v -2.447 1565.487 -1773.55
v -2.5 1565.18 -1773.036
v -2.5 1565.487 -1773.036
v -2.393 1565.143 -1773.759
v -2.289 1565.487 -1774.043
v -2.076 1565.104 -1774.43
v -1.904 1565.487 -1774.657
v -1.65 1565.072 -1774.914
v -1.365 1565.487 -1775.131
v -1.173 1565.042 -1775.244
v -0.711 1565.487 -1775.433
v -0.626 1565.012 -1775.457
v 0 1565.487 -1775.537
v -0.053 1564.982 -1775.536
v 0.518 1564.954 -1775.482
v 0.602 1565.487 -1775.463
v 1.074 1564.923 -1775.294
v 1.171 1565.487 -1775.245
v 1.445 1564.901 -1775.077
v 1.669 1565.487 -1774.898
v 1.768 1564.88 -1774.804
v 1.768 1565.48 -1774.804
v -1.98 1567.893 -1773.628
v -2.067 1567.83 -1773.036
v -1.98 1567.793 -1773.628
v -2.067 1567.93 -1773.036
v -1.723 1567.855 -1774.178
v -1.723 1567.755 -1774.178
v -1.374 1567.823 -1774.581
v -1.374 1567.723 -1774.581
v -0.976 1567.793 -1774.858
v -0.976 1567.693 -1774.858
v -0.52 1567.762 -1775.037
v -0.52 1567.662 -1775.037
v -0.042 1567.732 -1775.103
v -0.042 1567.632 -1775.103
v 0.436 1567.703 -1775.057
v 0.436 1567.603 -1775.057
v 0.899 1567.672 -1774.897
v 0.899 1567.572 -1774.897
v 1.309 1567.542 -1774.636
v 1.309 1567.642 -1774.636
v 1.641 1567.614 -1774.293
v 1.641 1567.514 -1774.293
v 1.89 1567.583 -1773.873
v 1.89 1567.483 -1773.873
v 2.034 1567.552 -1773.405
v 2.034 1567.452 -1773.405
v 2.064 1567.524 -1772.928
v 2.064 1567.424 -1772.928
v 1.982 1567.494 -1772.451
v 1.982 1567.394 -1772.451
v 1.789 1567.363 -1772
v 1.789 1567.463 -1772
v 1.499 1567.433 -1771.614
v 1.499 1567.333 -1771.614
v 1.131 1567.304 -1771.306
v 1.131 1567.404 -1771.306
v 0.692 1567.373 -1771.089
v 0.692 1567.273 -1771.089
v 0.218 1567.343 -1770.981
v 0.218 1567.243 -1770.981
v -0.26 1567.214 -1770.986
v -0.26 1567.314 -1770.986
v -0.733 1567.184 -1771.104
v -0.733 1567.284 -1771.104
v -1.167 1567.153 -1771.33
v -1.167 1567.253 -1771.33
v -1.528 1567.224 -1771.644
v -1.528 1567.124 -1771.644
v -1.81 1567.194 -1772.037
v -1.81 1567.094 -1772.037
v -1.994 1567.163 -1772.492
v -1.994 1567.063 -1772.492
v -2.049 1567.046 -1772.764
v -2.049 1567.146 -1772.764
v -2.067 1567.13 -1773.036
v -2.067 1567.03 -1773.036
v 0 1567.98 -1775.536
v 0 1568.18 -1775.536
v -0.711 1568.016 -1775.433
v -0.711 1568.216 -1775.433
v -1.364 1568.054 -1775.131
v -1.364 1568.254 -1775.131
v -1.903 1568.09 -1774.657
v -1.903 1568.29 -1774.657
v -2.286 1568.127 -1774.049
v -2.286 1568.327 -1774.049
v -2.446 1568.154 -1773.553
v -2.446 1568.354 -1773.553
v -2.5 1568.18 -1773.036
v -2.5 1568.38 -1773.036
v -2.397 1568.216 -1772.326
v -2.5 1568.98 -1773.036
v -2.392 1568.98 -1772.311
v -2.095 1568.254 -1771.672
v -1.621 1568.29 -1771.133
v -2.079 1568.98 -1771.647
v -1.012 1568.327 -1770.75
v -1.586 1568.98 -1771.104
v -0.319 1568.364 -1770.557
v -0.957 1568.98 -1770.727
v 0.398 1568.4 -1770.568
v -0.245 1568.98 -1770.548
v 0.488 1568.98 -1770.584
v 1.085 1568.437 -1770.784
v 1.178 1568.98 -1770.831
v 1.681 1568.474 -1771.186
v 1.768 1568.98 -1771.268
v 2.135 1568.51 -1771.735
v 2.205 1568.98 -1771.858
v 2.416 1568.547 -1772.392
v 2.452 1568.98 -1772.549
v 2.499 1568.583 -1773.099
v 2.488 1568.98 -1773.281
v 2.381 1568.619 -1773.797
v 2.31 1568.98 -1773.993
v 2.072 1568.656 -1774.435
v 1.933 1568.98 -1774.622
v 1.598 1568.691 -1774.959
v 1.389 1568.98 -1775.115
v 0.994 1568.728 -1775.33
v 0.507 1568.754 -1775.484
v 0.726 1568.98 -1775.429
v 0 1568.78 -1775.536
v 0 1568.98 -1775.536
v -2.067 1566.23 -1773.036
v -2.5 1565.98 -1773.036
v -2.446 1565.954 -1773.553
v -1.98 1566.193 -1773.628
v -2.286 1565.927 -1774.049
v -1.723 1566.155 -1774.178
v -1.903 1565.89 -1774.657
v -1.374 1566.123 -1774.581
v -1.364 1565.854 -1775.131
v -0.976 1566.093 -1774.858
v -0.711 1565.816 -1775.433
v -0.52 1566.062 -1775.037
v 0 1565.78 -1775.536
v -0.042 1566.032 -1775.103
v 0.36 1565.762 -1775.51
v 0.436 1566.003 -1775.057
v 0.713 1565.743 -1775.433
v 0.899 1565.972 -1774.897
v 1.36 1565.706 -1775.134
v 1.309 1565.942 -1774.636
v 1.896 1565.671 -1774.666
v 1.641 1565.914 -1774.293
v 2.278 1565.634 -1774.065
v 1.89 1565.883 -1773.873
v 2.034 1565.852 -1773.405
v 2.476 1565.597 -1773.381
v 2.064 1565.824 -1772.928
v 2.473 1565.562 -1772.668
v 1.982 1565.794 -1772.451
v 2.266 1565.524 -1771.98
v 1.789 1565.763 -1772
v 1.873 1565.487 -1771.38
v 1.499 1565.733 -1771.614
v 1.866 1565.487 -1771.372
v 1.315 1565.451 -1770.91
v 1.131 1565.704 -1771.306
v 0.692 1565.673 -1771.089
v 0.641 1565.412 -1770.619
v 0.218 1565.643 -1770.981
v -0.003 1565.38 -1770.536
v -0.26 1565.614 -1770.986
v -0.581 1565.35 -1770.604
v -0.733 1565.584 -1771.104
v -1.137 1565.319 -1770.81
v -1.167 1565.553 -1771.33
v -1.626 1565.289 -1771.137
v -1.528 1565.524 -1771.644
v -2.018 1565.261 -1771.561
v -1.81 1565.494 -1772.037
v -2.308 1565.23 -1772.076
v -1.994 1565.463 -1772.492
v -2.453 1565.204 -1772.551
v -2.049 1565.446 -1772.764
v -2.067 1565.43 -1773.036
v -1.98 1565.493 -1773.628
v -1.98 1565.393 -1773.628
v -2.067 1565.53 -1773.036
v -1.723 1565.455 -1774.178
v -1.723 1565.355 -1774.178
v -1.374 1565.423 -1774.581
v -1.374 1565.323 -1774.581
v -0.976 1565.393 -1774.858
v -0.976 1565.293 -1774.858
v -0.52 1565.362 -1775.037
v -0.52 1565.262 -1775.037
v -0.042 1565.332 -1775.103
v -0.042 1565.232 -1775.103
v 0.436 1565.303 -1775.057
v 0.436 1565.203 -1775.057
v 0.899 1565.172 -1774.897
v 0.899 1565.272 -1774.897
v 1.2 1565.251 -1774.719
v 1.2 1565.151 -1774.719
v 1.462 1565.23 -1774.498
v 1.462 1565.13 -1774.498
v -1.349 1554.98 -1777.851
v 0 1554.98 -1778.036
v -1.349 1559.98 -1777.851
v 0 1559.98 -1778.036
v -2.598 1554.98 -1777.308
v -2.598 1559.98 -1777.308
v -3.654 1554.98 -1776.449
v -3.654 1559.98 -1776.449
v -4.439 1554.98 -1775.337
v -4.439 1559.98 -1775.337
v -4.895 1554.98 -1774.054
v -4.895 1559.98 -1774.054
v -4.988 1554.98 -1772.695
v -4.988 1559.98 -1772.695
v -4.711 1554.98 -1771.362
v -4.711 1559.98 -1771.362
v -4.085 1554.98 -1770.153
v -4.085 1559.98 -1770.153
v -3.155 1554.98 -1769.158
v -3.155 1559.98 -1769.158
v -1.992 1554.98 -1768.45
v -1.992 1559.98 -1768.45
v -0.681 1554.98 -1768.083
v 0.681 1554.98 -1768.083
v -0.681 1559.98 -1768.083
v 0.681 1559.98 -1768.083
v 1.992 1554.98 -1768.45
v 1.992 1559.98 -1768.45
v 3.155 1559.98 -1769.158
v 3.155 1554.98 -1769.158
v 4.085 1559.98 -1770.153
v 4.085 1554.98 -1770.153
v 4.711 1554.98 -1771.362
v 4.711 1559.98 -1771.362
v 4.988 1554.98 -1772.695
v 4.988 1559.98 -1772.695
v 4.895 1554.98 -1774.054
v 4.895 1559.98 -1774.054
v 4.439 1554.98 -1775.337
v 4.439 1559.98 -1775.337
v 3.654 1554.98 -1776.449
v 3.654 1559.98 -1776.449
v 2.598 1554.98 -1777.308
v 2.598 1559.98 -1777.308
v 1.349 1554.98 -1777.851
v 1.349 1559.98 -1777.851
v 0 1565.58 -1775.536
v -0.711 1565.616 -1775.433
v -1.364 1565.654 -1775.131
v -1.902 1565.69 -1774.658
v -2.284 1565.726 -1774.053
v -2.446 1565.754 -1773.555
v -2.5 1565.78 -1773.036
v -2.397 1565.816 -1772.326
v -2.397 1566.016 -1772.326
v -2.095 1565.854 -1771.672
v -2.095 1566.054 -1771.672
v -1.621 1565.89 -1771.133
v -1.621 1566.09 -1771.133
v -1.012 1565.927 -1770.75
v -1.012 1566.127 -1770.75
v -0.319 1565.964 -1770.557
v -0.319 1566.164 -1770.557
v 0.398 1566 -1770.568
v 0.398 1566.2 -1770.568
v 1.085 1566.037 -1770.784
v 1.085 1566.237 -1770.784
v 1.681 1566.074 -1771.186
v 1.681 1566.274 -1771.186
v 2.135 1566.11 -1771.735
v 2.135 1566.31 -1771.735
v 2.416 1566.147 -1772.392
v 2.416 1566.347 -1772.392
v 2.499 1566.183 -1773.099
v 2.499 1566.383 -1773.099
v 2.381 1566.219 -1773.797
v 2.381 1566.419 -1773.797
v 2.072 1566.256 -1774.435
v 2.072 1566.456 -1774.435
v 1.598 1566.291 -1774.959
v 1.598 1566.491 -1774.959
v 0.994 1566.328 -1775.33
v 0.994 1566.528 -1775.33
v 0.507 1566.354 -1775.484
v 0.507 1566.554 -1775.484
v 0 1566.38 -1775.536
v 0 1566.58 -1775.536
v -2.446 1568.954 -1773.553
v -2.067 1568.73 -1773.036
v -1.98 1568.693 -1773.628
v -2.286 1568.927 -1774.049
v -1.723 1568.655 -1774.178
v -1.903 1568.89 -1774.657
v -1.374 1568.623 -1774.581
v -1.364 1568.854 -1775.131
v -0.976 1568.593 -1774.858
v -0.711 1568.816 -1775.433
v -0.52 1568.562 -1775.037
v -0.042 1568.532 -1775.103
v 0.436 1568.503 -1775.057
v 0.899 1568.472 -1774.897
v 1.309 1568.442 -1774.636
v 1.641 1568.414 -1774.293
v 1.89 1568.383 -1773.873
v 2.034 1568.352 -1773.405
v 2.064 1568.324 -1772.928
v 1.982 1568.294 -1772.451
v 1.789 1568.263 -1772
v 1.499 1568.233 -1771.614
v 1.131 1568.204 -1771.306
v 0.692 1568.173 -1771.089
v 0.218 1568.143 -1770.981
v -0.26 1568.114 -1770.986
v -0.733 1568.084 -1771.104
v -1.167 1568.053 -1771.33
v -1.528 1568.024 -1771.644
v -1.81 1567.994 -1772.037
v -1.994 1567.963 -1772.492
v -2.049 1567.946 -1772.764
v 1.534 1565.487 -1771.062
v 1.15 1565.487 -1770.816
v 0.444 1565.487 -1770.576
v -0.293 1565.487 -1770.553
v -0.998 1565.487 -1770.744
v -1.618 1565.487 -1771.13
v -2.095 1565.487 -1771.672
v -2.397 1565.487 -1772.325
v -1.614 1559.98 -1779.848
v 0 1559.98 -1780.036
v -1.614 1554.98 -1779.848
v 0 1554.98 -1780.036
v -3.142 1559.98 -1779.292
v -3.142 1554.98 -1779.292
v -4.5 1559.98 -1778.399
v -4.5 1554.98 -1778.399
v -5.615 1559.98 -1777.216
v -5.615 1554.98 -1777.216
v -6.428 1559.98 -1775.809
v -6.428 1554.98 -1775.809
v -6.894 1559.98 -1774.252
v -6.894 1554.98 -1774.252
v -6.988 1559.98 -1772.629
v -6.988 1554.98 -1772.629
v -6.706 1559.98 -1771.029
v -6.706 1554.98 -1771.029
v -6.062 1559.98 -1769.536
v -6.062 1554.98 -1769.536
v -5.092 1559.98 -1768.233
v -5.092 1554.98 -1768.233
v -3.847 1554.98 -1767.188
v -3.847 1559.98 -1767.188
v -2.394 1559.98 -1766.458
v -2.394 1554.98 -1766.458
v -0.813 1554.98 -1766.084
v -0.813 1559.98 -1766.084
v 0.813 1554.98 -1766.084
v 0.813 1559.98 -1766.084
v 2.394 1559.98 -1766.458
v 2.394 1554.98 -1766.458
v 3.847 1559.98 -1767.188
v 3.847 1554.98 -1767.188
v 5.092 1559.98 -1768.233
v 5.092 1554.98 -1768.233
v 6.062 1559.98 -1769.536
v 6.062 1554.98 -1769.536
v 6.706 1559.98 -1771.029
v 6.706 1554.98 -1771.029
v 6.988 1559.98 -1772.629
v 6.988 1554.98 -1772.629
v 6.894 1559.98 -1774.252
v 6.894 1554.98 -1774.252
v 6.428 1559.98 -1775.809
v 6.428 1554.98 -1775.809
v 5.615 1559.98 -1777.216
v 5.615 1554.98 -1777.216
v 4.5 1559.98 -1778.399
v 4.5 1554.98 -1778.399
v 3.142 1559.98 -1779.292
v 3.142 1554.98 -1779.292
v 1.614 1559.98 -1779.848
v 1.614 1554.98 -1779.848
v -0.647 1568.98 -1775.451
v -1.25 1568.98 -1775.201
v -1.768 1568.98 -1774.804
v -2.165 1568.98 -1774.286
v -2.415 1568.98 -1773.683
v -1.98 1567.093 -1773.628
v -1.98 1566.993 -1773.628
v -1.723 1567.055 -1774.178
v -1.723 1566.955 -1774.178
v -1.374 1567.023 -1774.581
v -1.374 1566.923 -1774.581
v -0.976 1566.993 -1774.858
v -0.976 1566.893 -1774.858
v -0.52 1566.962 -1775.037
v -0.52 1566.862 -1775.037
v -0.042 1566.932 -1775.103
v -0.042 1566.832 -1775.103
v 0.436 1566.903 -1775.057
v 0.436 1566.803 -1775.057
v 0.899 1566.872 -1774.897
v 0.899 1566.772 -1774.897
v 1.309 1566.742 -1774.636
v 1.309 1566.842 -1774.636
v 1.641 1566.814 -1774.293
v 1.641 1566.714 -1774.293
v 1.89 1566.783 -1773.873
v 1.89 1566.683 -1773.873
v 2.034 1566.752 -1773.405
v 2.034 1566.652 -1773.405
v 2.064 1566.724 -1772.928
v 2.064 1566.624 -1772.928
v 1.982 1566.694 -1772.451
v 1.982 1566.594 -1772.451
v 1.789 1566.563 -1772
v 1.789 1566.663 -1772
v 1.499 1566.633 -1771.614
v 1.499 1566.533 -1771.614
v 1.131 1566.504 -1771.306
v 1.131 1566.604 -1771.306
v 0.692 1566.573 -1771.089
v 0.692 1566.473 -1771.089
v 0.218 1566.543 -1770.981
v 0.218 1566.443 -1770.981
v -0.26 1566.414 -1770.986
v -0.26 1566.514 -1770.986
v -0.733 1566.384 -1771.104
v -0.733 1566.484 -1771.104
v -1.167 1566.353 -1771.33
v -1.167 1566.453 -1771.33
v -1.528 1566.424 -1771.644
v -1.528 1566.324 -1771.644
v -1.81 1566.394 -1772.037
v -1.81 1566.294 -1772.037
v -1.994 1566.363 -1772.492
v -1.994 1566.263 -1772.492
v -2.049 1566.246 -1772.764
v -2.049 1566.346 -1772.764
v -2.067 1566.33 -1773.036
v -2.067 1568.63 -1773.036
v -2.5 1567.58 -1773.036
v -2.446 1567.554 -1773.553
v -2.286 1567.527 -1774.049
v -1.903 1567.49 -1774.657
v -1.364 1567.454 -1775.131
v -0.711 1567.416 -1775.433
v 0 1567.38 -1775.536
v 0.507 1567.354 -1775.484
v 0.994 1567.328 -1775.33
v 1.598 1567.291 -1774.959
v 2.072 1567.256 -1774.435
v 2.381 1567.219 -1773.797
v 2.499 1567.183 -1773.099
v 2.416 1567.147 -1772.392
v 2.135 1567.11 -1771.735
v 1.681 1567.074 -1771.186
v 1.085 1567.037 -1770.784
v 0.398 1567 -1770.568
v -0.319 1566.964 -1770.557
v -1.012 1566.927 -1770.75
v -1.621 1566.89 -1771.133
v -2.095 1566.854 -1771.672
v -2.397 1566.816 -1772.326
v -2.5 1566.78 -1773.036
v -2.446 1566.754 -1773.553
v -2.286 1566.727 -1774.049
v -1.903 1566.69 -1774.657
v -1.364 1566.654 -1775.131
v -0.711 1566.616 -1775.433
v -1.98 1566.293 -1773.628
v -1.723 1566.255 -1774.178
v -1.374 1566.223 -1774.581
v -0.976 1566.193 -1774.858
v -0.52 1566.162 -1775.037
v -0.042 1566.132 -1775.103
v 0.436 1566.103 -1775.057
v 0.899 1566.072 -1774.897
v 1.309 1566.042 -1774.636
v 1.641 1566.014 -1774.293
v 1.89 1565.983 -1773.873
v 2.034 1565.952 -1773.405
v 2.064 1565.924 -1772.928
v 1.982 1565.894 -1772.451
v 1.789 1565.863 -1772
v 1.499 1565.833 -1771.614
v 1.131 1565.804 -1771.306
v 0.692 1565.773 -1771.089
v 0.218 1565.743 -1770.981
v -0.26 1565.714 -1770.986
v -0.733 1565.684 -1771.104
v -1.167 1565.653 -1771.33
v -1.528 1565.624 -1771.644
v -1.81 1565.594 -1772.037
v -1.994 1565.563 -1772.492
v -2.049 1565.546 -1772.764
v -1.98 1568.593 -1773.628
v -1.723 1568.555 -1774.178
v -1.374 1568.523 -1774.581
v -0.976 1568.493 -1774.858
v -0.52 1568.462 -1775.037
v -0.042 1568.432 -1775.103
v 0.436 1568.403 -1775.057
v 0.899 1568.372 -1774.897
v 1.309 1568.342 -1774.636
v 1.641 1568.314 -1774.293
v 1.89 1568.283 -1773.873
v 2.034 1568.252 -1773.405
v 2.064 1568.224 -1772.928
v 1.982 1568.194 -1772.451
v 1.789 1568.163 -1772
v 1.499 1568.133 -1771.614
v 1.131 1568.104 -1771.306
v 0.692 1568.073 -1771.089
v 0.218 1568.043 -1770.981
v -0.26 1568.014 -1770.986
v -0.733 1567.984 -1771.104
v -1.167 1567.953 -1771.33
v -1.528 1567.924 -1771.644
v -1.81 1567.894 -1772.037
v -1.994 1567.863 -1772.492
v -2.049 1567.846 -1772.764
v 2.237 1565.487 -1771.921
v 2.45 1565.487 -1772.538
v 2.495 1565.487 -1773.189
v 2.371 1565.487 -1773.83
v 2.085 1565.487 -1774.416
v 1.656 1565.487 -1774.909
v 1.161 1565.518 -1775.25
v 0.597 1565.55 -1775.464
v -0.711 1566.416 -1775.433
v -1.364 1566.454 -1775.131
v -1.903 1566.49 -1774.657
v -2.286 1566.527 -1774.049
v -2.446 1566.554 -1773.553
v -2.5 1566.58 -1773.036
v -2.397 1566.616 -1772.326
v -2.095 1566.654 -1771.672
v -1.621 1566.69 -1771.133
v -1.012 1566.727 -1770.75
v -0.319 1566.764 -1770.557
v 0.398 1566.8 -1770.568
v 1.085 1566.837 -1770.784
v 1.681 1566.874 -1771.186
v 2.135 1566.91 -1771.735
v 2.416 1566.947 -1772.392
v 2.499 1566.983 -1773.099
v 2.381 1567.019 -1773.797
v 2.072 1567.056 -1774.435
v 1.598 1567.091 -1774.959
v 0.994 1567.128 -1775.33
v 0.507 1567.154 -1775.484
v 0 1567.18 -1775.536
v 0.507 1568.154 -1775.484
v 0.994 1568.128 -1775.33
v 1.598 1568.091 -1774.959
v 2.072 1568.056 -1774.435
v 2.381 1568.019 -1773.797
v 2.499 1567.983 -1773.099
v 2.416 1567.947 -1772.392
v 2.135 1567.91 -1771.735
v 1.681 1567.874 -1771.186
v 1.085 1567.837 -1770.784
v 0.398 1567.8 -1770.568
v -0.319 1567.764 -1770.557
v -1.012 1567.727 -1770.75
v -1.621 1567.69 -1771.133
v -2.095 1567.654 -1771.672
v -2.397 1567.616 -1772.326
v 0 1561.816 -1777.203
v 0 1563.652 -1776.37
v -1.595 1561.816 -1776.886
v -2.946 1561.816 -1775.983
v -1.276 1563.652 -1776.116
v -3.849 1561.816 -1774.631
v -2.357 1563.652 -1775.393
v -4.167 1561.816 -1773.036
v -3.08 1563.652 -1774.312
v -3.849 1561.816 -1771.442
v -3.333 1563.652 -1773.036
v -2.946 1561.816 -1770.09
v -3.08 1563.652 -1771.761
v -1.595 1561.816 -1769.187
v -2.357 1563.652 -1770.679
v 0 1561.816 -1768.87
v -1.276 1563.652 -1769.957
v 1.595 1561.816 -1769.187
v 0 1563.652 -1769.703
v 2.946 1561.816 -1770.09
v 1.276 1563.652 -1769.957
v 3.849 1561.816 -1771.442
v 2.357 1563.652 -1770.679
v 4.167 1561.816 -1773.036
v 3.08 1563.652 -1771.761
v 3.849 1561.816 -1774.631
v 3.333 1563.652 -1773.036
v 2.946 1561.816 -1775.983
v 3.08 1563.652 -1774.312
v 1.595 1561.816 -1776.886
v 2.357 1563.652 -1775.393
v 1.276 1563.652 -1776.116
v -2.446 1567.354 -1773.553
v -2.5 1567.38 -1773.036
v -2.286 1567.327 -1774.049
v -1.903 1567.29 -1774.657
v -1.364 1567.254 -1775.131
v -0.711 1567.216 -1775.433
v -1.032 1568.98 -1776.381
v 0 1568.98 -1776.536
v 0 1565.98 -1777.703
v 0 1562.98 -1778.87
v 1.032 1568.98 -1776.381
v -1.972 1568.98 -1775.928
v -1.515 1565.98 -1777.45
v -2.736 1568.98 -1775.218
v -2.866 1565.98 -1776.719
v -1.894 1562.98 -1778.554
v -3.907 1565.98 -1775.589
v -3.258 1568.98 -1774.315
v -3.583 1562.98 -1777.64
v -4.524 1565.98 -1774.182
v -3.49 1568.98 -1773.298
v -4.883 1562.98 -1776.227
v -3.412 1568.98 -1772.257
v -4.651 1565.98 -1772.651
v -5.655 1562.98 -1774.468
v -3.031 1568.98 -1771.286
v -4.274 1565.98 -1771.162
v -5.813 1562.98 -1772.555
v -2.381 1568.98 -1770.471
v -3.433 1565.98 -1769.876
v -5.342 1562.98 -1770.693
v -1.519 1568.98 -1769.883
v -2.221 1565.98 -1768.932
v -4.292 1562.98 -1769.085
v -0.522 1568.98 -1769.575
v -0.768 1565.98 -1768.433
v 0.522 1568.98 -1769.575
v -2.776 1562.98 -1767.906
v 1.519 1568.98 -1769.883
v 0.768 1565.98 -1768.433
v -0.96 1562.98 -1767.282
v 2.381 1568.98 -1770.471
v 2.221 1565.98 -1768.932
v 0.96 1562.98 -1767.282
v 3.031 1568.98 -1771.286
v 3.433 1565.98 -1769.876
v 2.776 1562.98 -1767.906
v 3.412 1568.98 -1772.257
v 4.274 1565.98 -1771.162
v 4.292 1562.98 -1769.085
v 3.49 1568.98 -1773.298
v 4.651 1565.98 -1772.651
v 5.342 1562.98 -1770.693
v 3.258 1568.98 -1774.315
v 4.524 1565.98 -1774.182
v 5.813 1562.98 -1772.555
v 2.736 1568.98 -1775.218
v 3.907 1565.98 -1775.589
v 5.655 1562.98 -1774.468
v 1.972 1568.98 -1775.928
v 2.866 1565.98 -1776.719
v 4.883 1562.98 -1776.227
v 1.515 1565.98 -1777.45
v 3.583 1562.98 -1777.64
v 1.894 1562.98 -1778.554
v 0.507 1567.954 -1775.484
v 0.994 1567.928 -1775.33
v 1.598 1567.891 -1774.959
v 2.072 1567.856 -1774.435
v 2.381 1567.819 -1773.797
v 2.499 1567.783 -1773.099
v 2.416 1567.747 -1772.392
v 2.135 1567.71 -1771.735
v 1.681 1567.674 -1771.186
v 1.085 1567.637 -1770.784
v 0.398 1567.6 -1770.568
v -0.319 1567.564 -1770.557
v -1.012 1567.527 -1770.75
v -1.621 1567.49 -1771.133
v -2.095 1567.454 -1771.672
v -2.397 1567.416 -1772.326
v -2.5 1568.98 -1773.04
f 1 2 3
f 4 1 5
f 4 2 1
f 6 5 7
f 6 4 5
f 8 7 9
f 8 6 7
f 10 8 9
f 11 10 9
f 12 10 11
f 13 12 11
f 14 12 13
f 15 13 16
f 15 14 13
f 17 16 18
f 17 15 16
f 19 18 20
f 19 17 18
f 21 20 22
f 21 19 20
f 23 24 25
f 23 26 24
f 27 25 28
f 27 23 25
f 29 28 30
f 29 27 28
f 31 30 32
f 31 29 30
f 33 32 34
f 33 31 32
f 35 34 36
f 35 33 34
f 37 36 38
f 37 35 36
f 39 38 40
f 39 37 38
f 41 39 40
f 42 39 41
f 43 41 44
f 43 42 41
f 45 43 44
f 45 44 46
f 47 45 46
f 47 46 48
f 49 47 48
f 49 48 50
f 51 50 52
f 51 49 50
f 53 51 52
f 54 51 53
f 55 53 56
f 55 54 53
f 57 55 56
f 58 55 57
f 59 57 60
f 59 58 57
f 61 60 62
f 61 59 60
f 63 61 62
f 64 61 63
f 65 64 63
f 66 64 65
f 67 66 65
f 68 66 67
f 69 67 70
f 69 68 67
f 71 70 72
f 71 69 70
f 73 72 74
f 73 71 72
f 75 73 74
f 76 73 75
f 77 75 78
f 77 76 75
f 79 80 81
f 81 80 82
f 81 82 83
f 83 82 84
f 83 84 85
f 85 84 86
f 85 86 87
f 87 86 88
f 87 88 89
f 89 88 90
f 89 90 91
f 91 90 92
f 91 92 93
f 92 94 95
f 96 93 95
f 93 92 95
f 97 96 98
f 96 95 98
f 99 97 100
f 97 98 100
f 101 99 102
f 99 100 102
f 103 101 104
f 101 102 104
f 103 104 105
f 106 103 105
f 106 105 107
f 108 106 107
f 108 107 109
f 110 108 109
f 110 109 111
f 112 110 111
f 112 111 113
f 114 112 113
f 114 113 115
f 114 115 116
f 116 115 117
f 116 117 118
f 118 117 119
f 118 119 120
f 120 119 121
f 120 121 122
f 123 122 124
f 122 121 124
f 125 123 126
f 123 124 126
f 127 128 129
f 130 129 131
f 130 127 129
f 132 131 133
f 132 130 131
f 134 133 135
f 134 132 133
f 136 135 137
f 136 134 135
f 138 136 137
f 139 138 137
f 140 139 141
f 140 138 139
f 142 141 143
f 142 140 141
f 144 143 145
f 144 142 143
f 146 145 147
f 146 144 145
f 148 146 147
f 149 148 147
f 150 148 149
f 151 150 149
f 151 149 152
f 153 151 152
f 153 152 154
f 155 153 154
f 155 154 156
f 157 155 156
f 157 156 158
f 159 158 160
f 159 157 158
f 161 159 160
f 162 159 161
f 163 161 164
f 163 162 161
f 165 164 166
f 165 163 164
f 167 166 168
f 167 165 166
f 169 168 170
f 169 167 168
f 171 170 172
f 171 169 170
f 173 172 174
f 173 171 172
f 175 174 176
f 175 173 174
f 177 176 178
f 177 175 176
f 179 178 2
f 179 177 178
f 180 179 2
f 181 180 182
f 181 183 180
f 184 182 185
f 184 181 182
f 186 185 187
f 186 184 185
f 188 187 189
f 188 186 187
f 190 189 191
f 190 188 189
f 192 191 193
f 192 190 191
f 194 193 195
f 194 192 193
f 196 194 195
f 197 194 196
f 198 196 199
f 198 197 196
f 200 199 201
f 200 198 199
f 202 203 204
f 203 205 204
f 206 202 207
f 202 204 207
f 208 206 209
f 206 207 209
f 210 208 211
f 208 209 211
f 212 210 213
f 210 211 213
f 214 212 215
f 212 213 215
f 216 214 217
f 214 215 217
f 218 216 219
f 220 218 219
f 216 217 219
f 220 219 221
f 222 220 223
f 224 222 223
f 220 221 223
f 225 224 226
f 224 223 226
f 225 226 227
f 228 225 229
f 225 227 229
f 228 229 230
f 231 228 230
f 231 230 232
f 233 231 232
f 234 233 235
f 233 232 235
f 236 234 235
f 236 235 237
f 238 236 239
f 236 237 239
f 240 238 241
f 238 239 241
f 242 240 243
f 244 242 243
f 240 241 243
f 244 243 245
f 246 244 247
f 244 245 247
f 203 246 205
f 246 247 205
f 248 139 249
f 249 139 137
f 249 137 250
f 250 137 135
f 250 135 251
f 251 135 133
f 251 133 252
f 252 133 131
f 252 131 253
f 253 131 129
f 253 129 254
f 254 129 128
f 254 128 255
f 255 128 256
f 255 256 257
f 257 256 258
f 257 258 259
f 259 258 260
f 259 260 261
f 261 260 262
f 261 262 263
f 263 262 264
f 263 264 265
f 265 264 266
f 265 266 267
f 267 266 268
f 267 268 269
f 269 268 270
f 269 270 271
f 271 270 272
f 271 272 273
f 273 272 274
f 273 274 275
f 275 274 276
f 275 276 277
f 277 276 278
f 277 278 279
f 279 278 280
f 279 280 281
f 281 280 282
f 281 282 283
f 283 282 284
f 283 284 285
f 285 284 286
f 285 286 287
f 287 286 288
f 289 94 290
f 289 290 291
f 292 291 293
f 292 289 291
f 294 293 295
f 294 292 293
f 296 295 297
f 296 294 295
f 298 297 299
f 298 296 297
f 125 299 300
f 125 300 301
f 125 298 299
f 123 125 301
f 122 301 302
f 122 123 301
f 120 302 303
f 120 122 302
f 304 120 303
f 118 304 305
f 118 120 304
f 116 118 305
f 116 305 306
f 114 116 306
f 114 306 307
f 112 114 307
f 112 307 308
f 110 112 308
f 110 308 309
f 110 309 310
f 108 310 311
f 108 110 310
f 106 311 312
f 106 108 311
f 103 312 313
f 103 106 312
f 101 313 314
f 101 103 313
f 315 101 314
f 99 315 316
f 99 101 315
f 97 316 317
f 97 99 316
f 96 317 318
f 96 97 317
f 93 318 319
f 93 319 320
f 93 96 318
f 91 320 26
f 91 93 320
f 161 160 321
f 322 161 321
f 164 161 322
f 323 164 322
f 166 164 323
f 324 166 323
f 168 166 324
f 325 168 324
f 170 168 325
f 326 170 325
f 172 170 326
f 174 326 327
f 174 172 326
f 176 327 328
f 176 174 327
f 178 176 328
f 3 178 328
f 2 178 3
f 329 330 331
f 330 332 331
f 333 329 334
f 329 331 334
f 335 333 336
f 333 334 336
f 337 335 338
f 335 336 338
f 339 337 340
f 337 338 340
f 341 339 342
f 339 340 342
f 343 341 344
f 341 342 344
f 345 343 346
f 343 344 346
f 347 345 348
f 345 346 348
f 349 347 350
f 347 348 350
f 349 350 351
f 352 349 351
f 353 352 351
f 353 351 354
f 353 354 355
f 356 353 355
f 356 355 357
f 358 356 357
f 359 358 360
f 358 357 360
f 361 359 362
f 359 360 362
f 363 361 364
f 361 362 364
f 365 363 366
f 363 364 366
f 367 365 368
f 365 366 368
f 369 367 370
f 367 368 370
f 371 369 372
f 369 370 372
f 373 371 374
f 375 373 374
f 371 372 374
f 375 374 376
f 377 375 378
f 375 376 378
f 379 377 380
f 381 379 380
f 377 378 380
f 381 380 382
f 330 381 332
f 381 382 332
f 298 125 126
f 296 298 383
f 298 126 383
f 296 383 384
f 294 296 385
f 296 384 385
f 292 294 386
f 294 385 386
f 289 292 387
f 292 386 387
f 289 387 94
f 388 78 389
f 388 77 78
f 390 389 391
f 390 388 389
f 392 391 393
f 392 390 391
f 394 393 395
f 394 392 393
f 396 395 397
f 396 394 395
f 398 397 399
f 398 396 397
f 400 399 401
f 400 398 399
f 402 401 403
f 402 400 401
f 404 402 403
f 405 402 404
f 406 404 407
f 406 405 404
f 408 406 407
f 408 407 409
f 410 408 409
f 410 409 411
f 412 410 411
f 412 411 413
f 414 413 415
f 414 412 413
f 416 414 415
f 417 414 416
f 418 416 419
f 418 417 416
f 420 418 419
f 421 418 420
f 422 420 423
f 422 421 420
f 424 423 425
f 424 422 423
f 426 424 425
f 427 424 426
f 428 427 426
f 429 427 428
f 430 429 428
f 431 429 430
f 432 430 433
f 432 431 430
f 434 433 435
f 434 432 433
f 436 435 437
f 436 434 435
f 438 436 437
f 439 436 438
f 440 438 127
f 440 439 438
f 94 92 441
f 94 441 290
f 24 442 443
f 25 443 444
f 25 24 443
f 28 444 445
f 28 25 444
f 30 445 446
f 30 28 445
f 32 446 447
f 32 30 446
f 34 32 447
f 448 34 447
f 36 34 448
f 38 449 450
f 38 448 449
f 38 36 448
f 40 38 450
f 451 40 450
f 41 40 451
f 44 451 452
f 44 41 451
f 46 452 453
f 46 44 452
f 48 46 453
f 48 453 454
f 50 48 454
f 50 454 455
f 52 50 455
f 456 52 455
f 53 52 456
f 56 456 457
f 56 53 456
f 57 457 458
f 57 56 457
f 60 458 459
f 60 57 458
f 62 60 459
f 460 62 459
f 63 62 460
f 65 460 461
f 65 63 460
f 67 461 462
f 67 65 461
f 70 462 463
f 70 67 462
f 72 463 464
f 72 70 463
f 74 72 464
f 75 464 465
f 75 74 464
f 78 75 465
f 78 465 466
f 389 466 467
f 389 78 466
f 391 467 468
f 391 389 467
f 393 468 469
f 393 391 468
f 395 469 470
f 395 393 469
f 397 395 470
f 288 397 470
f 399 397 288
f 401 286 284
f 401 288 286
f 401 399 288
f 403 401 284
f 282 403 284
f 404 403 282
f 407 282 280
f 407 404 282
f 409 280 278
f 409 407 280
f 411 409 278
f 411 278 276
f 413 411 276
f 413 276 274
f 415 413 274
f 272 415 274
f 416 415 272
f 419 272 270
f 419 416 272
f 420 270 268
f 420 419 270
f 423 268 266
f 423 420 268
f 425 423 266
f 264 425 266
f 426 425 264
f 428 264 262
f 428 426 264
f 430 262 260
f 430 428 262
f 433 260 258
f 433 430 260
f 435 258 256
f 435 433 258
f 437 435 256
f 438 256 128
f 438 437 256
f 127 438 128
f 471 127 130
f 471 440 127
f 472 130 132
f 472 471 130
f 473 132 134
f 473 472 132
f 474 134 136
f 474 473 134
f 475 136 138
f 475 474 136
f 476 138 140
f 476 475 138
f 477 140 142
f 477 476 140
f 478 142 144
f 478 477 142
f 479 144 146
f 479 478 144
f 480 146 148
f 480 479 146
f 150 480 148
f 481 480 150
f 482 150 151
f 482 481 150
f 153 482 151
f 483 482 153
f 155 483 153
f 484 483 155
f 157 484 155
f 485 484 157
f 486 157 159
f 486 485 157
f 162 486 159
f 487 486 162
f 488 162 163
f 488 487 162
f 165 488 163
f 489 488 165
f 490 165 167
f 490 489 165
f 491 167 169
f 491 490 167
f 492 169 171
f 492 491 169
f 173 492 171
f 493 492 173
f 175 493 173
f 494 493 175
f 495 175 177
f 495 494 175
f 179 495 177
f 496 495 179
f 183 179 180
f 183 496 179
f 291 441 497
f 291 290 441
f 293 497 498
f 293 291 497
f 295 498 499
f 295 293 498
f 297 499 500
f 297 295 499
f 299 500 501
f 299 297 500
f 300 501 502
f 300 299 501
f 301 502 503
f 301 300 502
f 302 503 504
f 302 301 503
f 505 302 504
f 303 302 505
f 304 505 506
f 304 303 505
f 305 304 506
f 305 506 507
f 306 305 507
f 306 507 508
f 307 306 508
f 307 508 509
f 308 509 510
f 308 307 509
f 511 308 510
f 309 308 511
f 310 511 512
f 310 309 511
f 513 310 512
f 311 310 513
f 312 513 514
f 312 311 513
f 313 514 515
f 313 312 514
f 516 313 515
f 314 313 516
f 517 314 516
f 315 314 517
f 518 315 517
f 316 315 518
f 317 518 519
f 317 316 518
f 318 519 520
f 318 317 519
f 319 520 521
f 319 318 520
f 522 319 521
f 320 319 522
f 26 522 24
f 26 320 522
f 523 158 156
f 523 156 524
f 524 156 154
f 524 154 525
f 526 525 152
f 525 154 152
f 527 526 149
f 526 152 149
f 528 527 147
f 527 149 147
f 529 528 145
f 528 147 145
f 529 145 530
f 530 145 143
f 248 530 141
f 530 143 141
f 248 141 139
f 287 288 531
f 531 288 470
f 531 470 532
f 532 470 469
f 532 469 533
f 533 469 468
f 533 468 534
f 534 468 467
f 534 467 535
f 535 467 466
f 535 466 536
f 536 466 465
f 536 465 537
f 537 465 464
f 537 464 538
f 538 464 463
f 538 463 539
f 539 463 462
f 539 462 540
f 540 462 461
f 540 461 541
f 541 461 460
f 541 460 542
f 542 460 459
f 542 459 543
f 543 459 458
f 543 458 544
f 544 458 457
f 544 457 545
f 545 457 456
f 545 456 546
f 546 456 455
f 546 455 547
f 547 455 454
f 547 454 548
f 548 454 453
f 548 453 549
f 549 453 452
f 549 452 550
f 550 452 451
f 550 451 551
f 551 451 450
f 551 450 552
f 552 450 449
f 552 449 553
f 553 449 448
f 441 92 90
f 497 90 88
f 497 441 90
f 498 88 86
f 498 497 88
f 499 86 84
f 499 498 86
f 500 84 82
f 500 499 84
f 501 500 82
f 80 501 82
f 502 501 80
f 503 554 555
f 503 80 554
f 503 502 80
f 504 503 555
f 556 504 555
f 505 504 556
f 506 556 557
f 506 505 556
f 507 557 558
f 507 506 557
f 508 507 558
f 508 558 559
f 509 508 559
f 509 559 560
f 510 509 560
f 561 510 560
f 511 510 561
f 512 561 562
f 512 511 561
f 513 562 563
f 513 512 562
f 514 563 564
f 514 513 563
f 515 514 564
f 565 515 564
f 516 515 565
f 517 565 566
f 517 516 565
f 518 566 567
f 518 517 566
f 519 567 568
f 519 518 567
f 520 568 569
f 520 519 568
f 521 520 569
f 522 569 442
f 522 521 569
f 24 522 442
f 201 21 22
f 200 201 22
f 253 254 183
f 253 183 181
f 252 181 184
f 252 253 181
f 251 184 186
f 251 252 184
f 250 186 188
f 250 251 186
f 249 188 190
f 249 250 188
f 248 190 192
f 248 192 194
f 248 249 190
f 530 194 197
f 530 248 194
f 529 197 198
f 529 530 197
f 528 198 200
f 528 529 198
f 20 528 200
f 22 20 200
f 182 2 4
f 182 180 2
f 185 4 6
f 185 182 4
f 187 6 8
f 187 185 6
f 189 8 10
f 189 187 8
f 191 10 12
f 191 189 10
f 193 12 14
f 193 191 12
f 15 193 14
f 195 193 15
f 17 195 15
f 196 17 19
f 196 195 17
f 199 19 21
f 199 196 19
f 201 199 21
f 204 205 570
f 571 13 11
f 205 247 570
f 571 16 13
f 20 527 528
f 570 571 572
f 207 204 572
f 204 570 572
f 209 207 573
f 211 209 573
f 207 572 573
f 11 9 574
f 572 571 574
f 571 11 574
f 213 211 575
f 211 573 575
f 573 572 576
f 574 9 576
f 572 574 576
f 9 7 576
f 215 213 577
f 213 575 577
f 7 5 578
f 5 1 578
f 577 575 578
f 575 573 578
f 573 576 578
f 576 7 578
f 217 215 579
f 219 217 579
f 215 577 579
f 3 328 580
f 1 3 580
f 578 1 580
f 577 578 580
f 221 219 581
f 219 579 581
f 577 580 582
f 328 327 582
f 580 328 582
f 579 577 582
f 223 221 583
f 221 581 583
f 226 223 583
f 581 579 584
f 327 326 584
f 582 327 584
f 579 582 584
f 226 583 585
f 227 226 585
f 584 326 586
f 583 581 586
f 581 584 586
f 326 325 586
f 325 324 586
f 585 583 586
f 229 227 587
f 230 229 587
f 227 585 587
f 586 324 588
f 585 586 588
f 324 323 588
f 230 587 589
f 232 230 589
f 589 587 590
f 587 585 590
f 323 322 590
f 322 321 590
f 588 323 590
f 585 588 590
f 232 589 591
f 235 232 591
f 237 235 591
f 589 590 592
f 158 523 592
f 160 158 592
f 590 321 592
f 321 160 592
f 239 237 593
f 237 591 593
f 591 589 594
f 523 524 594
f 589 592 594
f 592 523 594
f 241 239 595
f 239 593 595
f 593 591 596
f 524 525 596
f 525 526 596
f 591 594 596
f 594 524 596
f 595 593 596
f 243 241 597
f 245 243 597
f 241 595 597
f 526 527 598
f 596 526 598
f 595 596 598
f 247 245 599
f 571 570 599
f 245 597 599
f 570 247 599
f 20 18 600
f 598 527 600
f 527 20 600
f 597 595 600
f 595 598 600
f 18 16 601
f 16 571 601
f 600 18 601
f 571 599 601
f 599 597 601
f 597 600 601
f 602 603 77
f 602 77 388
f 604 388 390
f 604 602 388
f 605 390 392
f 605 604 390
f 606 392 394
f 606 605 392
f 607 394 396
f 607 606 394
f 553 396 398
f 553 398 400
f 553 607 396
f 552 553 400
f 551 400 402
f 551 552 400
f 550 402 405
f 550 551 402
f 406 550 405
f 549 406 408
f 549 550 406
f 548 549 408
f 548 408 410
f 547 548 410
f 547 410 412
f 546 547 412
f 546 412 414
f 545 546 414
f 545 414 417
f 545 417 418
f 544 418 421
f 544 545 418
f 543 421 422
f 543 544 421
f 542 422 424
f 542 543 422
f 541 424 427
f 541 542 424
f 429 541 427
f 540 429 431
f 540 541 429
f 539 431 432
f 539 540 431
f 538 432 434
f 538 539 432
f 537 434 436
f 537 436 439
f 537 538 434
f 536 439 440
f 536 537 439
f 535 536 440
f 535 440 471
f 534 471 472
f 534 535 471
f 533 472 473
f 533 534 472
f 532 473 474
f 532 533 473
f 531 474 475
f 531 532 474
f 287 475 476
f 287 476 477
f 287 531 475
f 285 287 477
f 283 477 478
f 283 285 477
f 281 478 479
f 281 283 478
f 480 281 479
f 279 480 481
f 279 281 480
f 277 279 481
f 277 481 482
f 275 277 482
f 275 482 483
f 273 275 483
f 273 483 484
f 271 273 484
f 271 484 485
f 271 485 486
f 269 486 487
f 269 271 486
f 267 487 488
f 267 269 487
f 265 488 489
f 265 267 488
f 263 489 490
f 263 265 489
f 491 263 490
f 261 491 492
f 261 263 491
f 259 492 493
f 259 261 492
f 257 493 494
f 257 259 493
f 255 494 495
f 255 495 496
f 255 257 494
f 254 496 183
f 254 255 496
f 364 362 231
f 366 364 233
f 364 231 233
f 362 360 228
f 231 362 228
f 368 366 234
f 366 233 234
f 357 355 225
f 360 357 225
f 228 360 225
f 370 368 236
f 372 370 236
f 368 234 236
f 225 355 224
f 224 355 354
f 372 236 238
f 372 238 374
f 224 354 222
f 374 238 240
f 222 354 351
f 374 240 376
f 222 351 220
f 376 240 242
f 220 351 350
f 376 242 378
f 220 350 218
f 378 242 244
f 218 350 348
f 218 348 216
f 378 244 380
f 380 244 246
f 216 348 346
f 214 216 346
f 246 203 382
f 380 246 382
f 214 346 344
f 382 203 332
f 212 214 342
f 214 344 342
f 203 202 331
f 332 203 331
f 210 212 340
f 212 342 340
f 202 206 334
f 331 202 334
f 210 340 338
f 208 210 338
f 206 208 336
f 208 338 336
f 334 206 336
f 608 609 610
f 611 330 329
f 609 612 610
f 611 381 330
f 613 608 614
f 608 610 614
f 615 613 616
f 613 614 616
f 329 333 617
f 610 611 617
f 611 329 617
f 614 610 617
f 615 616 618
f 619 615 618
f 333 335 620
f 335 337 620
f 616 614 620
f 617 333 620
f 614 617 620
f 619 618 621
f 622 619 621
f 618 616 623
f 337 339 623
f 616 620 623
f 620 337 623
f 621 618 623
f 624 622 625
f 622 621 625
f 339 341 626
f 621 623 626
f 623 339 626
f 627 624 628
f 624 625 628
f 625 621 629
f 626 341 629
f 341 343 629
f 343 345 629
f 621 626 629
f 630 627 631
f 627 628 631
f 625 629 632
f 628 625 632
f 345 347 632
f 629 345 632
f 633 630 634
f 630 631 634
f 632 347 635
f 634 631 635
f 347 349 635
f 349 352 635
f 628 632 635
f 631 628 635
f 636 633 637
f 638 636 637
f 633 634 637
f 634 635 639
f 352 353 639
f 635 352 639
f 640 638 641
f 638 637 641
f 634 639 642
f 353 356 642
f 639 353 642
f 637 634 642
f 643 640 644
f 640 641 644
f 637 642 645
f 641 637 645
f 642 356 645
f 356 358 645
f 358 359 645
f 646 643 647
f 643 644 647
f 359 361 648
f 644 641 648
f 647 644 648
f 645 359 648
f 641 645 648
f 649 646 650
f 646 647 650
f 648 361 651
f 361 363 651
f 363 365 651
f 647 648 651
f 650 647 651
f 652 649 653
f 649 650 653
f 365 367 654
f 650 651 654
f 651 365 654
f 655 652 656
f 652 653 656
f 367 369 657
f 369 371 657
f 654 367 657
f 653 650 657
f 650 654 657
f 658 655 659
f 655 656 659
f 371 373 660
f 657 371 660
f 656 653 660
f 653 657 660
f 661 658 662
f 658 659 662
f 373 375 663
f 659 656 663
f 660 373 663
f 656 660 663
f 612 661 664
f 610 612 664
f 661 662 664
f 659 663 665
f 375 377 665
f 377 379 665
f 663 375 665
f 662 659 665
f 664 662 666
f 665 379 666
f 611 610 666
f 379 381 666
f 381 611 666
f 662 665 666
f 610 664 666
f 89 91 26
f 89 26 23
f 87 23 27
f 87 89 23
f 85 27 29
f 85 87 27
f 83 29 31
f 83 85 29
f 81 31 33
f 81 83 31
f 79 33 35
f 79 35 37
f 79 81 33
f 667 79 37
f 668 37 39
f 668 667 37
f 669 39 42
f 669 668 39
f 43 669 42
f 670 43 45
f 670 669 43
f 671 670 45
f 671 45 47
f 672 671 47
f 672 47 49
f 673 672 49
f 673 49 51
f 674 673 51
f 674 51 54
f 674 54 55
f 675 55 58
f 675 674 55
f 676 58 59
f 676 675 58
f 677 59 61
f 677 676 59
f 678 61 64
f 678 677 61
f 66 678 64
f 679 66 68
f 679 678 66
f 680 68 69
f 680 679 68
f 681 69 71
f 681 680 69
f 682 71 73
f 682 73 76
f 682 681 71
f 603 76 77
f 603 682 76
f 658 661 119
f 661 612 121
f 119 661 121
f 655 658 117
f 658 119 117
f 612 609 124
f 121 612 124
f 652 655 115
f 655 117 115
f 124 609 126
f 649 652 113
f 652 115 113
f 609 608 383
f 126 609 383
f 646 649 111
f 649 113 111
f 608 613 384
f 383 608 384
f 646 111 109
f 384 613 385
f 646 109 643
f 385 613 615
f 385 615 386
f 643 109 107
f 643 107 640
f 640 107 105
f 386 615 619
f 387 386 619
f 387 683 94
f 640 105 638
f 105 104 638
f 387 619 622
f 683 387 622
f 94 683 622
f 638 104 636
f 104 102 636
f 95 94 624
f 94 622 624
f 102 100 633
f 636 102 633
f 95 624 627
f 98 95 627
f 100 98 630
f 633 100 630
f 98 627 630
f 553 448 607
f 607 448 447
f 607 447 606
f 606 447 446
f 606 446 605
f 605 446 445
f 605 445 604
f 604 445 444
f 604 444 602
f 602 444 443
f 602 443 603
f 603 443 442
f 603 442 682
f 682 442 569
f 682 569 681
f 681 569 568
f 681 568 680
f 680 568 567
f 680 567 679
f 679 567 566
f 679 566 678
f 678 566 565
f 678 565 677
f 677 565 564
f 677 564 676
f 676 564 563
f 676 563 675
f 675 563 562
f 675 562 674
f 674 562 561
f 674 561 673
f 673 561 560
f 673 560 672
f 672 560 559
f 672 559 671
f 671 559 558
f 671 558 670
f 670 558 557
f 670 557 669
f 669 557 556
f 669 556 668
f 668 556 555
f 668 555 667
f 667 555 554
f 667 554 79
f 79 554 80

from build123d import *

# Parameters (mm, degrees)
THREAD1_PITCH = 0.8


with BuildPart() as part:
    # Sketch1 → Revolve1 (revolve)
    with BuildSketch(Plane(origin=(0, 0, 0), x_dir=(0, 0, -1), z_dir=(1, 0, 0))):
        Polygon((1778.036254975, 1559.979920793), (1775.536254975, 1565.487394057), (1775.536254975, 1568.979920793), (1776.536254975, 1568.979920793), (1780.036254975, 1559.979920793), (1780.036254975, 1554.979920793), (1778.036254975, 1554.979920793), align=None)
    revolve(axis=Axis((0, 1554.979920793, -1773.036254975), (0, 1, 0)))

    # Thread1: the profile of Thread Profile1 profile screwed along a right-hand helix of 4.375 turns, 8 arcs to a turn; built about Z, then put on its axis
    thread1_z = Axis((0, 0, 0), (0, 0, 1))
    thread1_corners = [(2.5003, 0, 0.600173208), (2.066987296, 0, 0.350000001), (2.066987296, 0, 0.250000001), (2.5003, 0, -0.000173205)]
    with BuildLine(mode=Mode.PRIVATE) as thread1_profile:
        Line(thread1_corners[0], thread1_corners[1])
        Line(thread1_corners[1], thread1_corners[2])
        Line(thread1_corners[2], thread1_corners[3])
        Line(thread1_corners[3], thread1_corners[0])
    thread1_cap = Face(thread1_profile.wire())
    thread1_turn_angles = [0, 22.5, 45, 67.5, 90, 112.5, 135, 157.5, 180, 202.5, 225, 247.5, 270, 292.5, 315, 337.5, 360]
    thread1_turn_weights = [1, 0.9238795325112867, 1, 0.9238795325112867, 1, 0.9238795325112867, 1, 0.9238795325112867, 1, 0.9238795325112867, 1, 0.9238795325112867, 1, 0.9238795325112867, 1, 0.9238795325112867, 1]
    thread1_turn_rails = [Edge.make_bspline([Vector(p[0], p[1], 0).rotate(thread1_z, thread1_turn_angles[k]) / thread1_turn_weights[k] + Vector(0, 0, p[2] + THREAD1_PITCH * thread1_turn_angles[k] / 360) for k in range(17)], [0, 0, 0, 1, 1, 2, 2, 3, 3, 4, 4, 5, 5, 6, 6, 7, 7, 8, 8, 8], 2, thread1_turn_weights) for p in thread1_corners]
    thread1_turn_sides = [Face.make_surface_from_curves(thread1_turn_rails[p[0]], thread1_turn_rails[p[1]]) for p in [(0, 1), (1, 2), (2, 3), (3, 0)]]
    thread1_last_angles = [1440, 1462.5, 1485, 1507.5, 1530, 1552.5, 1575]
    thread1_last_weights = [1, 0.9238795325112867, 1, 0.9238795325112867, 1, 0.9238795325112867, 1]
    thread1_last_rails = [Edge.make_bspline([Vector(p[0], p[1], 0).rotate(thread1_z, thread1_last_angles[k]) / thread1_last_weights[k] + Vector(0, 0, p[2] + THREAD1_PITCH * thread1_last_angles[k] / 360) for k in range(7)], [0, 0, 0, 1, 1, 2, 2, 3, 3, 3], 2, thread1_last_weights) for p in thread1_corners]
    thread1_last_sides = [Face.make_surface_from_curves(thread1_last_rails[p[0]], thread1_last_rails[p[1]]) for p in [(0, 1), (1, 2), (2, 3), (3, 0)]]
    thread1 = Plane(origin=(0, 1568.979920793, -1773.036254975), x_dir=(-1, 0, 0), z_dir=(0, -1, 0)) * Solid(Shell([*[p.moved(Location((0, 0, THREAD1_PITCH * i))) for i in range(4) for p in thread1_turn_sides], *thread1_last_sides, thread1_cap, thread1_cap.rotate(thread1_z, 1575).moved(Location((0, 0, THREAD1_PITCH * 1575 / 360)))]))
    add(thread1)


solid = part.part
